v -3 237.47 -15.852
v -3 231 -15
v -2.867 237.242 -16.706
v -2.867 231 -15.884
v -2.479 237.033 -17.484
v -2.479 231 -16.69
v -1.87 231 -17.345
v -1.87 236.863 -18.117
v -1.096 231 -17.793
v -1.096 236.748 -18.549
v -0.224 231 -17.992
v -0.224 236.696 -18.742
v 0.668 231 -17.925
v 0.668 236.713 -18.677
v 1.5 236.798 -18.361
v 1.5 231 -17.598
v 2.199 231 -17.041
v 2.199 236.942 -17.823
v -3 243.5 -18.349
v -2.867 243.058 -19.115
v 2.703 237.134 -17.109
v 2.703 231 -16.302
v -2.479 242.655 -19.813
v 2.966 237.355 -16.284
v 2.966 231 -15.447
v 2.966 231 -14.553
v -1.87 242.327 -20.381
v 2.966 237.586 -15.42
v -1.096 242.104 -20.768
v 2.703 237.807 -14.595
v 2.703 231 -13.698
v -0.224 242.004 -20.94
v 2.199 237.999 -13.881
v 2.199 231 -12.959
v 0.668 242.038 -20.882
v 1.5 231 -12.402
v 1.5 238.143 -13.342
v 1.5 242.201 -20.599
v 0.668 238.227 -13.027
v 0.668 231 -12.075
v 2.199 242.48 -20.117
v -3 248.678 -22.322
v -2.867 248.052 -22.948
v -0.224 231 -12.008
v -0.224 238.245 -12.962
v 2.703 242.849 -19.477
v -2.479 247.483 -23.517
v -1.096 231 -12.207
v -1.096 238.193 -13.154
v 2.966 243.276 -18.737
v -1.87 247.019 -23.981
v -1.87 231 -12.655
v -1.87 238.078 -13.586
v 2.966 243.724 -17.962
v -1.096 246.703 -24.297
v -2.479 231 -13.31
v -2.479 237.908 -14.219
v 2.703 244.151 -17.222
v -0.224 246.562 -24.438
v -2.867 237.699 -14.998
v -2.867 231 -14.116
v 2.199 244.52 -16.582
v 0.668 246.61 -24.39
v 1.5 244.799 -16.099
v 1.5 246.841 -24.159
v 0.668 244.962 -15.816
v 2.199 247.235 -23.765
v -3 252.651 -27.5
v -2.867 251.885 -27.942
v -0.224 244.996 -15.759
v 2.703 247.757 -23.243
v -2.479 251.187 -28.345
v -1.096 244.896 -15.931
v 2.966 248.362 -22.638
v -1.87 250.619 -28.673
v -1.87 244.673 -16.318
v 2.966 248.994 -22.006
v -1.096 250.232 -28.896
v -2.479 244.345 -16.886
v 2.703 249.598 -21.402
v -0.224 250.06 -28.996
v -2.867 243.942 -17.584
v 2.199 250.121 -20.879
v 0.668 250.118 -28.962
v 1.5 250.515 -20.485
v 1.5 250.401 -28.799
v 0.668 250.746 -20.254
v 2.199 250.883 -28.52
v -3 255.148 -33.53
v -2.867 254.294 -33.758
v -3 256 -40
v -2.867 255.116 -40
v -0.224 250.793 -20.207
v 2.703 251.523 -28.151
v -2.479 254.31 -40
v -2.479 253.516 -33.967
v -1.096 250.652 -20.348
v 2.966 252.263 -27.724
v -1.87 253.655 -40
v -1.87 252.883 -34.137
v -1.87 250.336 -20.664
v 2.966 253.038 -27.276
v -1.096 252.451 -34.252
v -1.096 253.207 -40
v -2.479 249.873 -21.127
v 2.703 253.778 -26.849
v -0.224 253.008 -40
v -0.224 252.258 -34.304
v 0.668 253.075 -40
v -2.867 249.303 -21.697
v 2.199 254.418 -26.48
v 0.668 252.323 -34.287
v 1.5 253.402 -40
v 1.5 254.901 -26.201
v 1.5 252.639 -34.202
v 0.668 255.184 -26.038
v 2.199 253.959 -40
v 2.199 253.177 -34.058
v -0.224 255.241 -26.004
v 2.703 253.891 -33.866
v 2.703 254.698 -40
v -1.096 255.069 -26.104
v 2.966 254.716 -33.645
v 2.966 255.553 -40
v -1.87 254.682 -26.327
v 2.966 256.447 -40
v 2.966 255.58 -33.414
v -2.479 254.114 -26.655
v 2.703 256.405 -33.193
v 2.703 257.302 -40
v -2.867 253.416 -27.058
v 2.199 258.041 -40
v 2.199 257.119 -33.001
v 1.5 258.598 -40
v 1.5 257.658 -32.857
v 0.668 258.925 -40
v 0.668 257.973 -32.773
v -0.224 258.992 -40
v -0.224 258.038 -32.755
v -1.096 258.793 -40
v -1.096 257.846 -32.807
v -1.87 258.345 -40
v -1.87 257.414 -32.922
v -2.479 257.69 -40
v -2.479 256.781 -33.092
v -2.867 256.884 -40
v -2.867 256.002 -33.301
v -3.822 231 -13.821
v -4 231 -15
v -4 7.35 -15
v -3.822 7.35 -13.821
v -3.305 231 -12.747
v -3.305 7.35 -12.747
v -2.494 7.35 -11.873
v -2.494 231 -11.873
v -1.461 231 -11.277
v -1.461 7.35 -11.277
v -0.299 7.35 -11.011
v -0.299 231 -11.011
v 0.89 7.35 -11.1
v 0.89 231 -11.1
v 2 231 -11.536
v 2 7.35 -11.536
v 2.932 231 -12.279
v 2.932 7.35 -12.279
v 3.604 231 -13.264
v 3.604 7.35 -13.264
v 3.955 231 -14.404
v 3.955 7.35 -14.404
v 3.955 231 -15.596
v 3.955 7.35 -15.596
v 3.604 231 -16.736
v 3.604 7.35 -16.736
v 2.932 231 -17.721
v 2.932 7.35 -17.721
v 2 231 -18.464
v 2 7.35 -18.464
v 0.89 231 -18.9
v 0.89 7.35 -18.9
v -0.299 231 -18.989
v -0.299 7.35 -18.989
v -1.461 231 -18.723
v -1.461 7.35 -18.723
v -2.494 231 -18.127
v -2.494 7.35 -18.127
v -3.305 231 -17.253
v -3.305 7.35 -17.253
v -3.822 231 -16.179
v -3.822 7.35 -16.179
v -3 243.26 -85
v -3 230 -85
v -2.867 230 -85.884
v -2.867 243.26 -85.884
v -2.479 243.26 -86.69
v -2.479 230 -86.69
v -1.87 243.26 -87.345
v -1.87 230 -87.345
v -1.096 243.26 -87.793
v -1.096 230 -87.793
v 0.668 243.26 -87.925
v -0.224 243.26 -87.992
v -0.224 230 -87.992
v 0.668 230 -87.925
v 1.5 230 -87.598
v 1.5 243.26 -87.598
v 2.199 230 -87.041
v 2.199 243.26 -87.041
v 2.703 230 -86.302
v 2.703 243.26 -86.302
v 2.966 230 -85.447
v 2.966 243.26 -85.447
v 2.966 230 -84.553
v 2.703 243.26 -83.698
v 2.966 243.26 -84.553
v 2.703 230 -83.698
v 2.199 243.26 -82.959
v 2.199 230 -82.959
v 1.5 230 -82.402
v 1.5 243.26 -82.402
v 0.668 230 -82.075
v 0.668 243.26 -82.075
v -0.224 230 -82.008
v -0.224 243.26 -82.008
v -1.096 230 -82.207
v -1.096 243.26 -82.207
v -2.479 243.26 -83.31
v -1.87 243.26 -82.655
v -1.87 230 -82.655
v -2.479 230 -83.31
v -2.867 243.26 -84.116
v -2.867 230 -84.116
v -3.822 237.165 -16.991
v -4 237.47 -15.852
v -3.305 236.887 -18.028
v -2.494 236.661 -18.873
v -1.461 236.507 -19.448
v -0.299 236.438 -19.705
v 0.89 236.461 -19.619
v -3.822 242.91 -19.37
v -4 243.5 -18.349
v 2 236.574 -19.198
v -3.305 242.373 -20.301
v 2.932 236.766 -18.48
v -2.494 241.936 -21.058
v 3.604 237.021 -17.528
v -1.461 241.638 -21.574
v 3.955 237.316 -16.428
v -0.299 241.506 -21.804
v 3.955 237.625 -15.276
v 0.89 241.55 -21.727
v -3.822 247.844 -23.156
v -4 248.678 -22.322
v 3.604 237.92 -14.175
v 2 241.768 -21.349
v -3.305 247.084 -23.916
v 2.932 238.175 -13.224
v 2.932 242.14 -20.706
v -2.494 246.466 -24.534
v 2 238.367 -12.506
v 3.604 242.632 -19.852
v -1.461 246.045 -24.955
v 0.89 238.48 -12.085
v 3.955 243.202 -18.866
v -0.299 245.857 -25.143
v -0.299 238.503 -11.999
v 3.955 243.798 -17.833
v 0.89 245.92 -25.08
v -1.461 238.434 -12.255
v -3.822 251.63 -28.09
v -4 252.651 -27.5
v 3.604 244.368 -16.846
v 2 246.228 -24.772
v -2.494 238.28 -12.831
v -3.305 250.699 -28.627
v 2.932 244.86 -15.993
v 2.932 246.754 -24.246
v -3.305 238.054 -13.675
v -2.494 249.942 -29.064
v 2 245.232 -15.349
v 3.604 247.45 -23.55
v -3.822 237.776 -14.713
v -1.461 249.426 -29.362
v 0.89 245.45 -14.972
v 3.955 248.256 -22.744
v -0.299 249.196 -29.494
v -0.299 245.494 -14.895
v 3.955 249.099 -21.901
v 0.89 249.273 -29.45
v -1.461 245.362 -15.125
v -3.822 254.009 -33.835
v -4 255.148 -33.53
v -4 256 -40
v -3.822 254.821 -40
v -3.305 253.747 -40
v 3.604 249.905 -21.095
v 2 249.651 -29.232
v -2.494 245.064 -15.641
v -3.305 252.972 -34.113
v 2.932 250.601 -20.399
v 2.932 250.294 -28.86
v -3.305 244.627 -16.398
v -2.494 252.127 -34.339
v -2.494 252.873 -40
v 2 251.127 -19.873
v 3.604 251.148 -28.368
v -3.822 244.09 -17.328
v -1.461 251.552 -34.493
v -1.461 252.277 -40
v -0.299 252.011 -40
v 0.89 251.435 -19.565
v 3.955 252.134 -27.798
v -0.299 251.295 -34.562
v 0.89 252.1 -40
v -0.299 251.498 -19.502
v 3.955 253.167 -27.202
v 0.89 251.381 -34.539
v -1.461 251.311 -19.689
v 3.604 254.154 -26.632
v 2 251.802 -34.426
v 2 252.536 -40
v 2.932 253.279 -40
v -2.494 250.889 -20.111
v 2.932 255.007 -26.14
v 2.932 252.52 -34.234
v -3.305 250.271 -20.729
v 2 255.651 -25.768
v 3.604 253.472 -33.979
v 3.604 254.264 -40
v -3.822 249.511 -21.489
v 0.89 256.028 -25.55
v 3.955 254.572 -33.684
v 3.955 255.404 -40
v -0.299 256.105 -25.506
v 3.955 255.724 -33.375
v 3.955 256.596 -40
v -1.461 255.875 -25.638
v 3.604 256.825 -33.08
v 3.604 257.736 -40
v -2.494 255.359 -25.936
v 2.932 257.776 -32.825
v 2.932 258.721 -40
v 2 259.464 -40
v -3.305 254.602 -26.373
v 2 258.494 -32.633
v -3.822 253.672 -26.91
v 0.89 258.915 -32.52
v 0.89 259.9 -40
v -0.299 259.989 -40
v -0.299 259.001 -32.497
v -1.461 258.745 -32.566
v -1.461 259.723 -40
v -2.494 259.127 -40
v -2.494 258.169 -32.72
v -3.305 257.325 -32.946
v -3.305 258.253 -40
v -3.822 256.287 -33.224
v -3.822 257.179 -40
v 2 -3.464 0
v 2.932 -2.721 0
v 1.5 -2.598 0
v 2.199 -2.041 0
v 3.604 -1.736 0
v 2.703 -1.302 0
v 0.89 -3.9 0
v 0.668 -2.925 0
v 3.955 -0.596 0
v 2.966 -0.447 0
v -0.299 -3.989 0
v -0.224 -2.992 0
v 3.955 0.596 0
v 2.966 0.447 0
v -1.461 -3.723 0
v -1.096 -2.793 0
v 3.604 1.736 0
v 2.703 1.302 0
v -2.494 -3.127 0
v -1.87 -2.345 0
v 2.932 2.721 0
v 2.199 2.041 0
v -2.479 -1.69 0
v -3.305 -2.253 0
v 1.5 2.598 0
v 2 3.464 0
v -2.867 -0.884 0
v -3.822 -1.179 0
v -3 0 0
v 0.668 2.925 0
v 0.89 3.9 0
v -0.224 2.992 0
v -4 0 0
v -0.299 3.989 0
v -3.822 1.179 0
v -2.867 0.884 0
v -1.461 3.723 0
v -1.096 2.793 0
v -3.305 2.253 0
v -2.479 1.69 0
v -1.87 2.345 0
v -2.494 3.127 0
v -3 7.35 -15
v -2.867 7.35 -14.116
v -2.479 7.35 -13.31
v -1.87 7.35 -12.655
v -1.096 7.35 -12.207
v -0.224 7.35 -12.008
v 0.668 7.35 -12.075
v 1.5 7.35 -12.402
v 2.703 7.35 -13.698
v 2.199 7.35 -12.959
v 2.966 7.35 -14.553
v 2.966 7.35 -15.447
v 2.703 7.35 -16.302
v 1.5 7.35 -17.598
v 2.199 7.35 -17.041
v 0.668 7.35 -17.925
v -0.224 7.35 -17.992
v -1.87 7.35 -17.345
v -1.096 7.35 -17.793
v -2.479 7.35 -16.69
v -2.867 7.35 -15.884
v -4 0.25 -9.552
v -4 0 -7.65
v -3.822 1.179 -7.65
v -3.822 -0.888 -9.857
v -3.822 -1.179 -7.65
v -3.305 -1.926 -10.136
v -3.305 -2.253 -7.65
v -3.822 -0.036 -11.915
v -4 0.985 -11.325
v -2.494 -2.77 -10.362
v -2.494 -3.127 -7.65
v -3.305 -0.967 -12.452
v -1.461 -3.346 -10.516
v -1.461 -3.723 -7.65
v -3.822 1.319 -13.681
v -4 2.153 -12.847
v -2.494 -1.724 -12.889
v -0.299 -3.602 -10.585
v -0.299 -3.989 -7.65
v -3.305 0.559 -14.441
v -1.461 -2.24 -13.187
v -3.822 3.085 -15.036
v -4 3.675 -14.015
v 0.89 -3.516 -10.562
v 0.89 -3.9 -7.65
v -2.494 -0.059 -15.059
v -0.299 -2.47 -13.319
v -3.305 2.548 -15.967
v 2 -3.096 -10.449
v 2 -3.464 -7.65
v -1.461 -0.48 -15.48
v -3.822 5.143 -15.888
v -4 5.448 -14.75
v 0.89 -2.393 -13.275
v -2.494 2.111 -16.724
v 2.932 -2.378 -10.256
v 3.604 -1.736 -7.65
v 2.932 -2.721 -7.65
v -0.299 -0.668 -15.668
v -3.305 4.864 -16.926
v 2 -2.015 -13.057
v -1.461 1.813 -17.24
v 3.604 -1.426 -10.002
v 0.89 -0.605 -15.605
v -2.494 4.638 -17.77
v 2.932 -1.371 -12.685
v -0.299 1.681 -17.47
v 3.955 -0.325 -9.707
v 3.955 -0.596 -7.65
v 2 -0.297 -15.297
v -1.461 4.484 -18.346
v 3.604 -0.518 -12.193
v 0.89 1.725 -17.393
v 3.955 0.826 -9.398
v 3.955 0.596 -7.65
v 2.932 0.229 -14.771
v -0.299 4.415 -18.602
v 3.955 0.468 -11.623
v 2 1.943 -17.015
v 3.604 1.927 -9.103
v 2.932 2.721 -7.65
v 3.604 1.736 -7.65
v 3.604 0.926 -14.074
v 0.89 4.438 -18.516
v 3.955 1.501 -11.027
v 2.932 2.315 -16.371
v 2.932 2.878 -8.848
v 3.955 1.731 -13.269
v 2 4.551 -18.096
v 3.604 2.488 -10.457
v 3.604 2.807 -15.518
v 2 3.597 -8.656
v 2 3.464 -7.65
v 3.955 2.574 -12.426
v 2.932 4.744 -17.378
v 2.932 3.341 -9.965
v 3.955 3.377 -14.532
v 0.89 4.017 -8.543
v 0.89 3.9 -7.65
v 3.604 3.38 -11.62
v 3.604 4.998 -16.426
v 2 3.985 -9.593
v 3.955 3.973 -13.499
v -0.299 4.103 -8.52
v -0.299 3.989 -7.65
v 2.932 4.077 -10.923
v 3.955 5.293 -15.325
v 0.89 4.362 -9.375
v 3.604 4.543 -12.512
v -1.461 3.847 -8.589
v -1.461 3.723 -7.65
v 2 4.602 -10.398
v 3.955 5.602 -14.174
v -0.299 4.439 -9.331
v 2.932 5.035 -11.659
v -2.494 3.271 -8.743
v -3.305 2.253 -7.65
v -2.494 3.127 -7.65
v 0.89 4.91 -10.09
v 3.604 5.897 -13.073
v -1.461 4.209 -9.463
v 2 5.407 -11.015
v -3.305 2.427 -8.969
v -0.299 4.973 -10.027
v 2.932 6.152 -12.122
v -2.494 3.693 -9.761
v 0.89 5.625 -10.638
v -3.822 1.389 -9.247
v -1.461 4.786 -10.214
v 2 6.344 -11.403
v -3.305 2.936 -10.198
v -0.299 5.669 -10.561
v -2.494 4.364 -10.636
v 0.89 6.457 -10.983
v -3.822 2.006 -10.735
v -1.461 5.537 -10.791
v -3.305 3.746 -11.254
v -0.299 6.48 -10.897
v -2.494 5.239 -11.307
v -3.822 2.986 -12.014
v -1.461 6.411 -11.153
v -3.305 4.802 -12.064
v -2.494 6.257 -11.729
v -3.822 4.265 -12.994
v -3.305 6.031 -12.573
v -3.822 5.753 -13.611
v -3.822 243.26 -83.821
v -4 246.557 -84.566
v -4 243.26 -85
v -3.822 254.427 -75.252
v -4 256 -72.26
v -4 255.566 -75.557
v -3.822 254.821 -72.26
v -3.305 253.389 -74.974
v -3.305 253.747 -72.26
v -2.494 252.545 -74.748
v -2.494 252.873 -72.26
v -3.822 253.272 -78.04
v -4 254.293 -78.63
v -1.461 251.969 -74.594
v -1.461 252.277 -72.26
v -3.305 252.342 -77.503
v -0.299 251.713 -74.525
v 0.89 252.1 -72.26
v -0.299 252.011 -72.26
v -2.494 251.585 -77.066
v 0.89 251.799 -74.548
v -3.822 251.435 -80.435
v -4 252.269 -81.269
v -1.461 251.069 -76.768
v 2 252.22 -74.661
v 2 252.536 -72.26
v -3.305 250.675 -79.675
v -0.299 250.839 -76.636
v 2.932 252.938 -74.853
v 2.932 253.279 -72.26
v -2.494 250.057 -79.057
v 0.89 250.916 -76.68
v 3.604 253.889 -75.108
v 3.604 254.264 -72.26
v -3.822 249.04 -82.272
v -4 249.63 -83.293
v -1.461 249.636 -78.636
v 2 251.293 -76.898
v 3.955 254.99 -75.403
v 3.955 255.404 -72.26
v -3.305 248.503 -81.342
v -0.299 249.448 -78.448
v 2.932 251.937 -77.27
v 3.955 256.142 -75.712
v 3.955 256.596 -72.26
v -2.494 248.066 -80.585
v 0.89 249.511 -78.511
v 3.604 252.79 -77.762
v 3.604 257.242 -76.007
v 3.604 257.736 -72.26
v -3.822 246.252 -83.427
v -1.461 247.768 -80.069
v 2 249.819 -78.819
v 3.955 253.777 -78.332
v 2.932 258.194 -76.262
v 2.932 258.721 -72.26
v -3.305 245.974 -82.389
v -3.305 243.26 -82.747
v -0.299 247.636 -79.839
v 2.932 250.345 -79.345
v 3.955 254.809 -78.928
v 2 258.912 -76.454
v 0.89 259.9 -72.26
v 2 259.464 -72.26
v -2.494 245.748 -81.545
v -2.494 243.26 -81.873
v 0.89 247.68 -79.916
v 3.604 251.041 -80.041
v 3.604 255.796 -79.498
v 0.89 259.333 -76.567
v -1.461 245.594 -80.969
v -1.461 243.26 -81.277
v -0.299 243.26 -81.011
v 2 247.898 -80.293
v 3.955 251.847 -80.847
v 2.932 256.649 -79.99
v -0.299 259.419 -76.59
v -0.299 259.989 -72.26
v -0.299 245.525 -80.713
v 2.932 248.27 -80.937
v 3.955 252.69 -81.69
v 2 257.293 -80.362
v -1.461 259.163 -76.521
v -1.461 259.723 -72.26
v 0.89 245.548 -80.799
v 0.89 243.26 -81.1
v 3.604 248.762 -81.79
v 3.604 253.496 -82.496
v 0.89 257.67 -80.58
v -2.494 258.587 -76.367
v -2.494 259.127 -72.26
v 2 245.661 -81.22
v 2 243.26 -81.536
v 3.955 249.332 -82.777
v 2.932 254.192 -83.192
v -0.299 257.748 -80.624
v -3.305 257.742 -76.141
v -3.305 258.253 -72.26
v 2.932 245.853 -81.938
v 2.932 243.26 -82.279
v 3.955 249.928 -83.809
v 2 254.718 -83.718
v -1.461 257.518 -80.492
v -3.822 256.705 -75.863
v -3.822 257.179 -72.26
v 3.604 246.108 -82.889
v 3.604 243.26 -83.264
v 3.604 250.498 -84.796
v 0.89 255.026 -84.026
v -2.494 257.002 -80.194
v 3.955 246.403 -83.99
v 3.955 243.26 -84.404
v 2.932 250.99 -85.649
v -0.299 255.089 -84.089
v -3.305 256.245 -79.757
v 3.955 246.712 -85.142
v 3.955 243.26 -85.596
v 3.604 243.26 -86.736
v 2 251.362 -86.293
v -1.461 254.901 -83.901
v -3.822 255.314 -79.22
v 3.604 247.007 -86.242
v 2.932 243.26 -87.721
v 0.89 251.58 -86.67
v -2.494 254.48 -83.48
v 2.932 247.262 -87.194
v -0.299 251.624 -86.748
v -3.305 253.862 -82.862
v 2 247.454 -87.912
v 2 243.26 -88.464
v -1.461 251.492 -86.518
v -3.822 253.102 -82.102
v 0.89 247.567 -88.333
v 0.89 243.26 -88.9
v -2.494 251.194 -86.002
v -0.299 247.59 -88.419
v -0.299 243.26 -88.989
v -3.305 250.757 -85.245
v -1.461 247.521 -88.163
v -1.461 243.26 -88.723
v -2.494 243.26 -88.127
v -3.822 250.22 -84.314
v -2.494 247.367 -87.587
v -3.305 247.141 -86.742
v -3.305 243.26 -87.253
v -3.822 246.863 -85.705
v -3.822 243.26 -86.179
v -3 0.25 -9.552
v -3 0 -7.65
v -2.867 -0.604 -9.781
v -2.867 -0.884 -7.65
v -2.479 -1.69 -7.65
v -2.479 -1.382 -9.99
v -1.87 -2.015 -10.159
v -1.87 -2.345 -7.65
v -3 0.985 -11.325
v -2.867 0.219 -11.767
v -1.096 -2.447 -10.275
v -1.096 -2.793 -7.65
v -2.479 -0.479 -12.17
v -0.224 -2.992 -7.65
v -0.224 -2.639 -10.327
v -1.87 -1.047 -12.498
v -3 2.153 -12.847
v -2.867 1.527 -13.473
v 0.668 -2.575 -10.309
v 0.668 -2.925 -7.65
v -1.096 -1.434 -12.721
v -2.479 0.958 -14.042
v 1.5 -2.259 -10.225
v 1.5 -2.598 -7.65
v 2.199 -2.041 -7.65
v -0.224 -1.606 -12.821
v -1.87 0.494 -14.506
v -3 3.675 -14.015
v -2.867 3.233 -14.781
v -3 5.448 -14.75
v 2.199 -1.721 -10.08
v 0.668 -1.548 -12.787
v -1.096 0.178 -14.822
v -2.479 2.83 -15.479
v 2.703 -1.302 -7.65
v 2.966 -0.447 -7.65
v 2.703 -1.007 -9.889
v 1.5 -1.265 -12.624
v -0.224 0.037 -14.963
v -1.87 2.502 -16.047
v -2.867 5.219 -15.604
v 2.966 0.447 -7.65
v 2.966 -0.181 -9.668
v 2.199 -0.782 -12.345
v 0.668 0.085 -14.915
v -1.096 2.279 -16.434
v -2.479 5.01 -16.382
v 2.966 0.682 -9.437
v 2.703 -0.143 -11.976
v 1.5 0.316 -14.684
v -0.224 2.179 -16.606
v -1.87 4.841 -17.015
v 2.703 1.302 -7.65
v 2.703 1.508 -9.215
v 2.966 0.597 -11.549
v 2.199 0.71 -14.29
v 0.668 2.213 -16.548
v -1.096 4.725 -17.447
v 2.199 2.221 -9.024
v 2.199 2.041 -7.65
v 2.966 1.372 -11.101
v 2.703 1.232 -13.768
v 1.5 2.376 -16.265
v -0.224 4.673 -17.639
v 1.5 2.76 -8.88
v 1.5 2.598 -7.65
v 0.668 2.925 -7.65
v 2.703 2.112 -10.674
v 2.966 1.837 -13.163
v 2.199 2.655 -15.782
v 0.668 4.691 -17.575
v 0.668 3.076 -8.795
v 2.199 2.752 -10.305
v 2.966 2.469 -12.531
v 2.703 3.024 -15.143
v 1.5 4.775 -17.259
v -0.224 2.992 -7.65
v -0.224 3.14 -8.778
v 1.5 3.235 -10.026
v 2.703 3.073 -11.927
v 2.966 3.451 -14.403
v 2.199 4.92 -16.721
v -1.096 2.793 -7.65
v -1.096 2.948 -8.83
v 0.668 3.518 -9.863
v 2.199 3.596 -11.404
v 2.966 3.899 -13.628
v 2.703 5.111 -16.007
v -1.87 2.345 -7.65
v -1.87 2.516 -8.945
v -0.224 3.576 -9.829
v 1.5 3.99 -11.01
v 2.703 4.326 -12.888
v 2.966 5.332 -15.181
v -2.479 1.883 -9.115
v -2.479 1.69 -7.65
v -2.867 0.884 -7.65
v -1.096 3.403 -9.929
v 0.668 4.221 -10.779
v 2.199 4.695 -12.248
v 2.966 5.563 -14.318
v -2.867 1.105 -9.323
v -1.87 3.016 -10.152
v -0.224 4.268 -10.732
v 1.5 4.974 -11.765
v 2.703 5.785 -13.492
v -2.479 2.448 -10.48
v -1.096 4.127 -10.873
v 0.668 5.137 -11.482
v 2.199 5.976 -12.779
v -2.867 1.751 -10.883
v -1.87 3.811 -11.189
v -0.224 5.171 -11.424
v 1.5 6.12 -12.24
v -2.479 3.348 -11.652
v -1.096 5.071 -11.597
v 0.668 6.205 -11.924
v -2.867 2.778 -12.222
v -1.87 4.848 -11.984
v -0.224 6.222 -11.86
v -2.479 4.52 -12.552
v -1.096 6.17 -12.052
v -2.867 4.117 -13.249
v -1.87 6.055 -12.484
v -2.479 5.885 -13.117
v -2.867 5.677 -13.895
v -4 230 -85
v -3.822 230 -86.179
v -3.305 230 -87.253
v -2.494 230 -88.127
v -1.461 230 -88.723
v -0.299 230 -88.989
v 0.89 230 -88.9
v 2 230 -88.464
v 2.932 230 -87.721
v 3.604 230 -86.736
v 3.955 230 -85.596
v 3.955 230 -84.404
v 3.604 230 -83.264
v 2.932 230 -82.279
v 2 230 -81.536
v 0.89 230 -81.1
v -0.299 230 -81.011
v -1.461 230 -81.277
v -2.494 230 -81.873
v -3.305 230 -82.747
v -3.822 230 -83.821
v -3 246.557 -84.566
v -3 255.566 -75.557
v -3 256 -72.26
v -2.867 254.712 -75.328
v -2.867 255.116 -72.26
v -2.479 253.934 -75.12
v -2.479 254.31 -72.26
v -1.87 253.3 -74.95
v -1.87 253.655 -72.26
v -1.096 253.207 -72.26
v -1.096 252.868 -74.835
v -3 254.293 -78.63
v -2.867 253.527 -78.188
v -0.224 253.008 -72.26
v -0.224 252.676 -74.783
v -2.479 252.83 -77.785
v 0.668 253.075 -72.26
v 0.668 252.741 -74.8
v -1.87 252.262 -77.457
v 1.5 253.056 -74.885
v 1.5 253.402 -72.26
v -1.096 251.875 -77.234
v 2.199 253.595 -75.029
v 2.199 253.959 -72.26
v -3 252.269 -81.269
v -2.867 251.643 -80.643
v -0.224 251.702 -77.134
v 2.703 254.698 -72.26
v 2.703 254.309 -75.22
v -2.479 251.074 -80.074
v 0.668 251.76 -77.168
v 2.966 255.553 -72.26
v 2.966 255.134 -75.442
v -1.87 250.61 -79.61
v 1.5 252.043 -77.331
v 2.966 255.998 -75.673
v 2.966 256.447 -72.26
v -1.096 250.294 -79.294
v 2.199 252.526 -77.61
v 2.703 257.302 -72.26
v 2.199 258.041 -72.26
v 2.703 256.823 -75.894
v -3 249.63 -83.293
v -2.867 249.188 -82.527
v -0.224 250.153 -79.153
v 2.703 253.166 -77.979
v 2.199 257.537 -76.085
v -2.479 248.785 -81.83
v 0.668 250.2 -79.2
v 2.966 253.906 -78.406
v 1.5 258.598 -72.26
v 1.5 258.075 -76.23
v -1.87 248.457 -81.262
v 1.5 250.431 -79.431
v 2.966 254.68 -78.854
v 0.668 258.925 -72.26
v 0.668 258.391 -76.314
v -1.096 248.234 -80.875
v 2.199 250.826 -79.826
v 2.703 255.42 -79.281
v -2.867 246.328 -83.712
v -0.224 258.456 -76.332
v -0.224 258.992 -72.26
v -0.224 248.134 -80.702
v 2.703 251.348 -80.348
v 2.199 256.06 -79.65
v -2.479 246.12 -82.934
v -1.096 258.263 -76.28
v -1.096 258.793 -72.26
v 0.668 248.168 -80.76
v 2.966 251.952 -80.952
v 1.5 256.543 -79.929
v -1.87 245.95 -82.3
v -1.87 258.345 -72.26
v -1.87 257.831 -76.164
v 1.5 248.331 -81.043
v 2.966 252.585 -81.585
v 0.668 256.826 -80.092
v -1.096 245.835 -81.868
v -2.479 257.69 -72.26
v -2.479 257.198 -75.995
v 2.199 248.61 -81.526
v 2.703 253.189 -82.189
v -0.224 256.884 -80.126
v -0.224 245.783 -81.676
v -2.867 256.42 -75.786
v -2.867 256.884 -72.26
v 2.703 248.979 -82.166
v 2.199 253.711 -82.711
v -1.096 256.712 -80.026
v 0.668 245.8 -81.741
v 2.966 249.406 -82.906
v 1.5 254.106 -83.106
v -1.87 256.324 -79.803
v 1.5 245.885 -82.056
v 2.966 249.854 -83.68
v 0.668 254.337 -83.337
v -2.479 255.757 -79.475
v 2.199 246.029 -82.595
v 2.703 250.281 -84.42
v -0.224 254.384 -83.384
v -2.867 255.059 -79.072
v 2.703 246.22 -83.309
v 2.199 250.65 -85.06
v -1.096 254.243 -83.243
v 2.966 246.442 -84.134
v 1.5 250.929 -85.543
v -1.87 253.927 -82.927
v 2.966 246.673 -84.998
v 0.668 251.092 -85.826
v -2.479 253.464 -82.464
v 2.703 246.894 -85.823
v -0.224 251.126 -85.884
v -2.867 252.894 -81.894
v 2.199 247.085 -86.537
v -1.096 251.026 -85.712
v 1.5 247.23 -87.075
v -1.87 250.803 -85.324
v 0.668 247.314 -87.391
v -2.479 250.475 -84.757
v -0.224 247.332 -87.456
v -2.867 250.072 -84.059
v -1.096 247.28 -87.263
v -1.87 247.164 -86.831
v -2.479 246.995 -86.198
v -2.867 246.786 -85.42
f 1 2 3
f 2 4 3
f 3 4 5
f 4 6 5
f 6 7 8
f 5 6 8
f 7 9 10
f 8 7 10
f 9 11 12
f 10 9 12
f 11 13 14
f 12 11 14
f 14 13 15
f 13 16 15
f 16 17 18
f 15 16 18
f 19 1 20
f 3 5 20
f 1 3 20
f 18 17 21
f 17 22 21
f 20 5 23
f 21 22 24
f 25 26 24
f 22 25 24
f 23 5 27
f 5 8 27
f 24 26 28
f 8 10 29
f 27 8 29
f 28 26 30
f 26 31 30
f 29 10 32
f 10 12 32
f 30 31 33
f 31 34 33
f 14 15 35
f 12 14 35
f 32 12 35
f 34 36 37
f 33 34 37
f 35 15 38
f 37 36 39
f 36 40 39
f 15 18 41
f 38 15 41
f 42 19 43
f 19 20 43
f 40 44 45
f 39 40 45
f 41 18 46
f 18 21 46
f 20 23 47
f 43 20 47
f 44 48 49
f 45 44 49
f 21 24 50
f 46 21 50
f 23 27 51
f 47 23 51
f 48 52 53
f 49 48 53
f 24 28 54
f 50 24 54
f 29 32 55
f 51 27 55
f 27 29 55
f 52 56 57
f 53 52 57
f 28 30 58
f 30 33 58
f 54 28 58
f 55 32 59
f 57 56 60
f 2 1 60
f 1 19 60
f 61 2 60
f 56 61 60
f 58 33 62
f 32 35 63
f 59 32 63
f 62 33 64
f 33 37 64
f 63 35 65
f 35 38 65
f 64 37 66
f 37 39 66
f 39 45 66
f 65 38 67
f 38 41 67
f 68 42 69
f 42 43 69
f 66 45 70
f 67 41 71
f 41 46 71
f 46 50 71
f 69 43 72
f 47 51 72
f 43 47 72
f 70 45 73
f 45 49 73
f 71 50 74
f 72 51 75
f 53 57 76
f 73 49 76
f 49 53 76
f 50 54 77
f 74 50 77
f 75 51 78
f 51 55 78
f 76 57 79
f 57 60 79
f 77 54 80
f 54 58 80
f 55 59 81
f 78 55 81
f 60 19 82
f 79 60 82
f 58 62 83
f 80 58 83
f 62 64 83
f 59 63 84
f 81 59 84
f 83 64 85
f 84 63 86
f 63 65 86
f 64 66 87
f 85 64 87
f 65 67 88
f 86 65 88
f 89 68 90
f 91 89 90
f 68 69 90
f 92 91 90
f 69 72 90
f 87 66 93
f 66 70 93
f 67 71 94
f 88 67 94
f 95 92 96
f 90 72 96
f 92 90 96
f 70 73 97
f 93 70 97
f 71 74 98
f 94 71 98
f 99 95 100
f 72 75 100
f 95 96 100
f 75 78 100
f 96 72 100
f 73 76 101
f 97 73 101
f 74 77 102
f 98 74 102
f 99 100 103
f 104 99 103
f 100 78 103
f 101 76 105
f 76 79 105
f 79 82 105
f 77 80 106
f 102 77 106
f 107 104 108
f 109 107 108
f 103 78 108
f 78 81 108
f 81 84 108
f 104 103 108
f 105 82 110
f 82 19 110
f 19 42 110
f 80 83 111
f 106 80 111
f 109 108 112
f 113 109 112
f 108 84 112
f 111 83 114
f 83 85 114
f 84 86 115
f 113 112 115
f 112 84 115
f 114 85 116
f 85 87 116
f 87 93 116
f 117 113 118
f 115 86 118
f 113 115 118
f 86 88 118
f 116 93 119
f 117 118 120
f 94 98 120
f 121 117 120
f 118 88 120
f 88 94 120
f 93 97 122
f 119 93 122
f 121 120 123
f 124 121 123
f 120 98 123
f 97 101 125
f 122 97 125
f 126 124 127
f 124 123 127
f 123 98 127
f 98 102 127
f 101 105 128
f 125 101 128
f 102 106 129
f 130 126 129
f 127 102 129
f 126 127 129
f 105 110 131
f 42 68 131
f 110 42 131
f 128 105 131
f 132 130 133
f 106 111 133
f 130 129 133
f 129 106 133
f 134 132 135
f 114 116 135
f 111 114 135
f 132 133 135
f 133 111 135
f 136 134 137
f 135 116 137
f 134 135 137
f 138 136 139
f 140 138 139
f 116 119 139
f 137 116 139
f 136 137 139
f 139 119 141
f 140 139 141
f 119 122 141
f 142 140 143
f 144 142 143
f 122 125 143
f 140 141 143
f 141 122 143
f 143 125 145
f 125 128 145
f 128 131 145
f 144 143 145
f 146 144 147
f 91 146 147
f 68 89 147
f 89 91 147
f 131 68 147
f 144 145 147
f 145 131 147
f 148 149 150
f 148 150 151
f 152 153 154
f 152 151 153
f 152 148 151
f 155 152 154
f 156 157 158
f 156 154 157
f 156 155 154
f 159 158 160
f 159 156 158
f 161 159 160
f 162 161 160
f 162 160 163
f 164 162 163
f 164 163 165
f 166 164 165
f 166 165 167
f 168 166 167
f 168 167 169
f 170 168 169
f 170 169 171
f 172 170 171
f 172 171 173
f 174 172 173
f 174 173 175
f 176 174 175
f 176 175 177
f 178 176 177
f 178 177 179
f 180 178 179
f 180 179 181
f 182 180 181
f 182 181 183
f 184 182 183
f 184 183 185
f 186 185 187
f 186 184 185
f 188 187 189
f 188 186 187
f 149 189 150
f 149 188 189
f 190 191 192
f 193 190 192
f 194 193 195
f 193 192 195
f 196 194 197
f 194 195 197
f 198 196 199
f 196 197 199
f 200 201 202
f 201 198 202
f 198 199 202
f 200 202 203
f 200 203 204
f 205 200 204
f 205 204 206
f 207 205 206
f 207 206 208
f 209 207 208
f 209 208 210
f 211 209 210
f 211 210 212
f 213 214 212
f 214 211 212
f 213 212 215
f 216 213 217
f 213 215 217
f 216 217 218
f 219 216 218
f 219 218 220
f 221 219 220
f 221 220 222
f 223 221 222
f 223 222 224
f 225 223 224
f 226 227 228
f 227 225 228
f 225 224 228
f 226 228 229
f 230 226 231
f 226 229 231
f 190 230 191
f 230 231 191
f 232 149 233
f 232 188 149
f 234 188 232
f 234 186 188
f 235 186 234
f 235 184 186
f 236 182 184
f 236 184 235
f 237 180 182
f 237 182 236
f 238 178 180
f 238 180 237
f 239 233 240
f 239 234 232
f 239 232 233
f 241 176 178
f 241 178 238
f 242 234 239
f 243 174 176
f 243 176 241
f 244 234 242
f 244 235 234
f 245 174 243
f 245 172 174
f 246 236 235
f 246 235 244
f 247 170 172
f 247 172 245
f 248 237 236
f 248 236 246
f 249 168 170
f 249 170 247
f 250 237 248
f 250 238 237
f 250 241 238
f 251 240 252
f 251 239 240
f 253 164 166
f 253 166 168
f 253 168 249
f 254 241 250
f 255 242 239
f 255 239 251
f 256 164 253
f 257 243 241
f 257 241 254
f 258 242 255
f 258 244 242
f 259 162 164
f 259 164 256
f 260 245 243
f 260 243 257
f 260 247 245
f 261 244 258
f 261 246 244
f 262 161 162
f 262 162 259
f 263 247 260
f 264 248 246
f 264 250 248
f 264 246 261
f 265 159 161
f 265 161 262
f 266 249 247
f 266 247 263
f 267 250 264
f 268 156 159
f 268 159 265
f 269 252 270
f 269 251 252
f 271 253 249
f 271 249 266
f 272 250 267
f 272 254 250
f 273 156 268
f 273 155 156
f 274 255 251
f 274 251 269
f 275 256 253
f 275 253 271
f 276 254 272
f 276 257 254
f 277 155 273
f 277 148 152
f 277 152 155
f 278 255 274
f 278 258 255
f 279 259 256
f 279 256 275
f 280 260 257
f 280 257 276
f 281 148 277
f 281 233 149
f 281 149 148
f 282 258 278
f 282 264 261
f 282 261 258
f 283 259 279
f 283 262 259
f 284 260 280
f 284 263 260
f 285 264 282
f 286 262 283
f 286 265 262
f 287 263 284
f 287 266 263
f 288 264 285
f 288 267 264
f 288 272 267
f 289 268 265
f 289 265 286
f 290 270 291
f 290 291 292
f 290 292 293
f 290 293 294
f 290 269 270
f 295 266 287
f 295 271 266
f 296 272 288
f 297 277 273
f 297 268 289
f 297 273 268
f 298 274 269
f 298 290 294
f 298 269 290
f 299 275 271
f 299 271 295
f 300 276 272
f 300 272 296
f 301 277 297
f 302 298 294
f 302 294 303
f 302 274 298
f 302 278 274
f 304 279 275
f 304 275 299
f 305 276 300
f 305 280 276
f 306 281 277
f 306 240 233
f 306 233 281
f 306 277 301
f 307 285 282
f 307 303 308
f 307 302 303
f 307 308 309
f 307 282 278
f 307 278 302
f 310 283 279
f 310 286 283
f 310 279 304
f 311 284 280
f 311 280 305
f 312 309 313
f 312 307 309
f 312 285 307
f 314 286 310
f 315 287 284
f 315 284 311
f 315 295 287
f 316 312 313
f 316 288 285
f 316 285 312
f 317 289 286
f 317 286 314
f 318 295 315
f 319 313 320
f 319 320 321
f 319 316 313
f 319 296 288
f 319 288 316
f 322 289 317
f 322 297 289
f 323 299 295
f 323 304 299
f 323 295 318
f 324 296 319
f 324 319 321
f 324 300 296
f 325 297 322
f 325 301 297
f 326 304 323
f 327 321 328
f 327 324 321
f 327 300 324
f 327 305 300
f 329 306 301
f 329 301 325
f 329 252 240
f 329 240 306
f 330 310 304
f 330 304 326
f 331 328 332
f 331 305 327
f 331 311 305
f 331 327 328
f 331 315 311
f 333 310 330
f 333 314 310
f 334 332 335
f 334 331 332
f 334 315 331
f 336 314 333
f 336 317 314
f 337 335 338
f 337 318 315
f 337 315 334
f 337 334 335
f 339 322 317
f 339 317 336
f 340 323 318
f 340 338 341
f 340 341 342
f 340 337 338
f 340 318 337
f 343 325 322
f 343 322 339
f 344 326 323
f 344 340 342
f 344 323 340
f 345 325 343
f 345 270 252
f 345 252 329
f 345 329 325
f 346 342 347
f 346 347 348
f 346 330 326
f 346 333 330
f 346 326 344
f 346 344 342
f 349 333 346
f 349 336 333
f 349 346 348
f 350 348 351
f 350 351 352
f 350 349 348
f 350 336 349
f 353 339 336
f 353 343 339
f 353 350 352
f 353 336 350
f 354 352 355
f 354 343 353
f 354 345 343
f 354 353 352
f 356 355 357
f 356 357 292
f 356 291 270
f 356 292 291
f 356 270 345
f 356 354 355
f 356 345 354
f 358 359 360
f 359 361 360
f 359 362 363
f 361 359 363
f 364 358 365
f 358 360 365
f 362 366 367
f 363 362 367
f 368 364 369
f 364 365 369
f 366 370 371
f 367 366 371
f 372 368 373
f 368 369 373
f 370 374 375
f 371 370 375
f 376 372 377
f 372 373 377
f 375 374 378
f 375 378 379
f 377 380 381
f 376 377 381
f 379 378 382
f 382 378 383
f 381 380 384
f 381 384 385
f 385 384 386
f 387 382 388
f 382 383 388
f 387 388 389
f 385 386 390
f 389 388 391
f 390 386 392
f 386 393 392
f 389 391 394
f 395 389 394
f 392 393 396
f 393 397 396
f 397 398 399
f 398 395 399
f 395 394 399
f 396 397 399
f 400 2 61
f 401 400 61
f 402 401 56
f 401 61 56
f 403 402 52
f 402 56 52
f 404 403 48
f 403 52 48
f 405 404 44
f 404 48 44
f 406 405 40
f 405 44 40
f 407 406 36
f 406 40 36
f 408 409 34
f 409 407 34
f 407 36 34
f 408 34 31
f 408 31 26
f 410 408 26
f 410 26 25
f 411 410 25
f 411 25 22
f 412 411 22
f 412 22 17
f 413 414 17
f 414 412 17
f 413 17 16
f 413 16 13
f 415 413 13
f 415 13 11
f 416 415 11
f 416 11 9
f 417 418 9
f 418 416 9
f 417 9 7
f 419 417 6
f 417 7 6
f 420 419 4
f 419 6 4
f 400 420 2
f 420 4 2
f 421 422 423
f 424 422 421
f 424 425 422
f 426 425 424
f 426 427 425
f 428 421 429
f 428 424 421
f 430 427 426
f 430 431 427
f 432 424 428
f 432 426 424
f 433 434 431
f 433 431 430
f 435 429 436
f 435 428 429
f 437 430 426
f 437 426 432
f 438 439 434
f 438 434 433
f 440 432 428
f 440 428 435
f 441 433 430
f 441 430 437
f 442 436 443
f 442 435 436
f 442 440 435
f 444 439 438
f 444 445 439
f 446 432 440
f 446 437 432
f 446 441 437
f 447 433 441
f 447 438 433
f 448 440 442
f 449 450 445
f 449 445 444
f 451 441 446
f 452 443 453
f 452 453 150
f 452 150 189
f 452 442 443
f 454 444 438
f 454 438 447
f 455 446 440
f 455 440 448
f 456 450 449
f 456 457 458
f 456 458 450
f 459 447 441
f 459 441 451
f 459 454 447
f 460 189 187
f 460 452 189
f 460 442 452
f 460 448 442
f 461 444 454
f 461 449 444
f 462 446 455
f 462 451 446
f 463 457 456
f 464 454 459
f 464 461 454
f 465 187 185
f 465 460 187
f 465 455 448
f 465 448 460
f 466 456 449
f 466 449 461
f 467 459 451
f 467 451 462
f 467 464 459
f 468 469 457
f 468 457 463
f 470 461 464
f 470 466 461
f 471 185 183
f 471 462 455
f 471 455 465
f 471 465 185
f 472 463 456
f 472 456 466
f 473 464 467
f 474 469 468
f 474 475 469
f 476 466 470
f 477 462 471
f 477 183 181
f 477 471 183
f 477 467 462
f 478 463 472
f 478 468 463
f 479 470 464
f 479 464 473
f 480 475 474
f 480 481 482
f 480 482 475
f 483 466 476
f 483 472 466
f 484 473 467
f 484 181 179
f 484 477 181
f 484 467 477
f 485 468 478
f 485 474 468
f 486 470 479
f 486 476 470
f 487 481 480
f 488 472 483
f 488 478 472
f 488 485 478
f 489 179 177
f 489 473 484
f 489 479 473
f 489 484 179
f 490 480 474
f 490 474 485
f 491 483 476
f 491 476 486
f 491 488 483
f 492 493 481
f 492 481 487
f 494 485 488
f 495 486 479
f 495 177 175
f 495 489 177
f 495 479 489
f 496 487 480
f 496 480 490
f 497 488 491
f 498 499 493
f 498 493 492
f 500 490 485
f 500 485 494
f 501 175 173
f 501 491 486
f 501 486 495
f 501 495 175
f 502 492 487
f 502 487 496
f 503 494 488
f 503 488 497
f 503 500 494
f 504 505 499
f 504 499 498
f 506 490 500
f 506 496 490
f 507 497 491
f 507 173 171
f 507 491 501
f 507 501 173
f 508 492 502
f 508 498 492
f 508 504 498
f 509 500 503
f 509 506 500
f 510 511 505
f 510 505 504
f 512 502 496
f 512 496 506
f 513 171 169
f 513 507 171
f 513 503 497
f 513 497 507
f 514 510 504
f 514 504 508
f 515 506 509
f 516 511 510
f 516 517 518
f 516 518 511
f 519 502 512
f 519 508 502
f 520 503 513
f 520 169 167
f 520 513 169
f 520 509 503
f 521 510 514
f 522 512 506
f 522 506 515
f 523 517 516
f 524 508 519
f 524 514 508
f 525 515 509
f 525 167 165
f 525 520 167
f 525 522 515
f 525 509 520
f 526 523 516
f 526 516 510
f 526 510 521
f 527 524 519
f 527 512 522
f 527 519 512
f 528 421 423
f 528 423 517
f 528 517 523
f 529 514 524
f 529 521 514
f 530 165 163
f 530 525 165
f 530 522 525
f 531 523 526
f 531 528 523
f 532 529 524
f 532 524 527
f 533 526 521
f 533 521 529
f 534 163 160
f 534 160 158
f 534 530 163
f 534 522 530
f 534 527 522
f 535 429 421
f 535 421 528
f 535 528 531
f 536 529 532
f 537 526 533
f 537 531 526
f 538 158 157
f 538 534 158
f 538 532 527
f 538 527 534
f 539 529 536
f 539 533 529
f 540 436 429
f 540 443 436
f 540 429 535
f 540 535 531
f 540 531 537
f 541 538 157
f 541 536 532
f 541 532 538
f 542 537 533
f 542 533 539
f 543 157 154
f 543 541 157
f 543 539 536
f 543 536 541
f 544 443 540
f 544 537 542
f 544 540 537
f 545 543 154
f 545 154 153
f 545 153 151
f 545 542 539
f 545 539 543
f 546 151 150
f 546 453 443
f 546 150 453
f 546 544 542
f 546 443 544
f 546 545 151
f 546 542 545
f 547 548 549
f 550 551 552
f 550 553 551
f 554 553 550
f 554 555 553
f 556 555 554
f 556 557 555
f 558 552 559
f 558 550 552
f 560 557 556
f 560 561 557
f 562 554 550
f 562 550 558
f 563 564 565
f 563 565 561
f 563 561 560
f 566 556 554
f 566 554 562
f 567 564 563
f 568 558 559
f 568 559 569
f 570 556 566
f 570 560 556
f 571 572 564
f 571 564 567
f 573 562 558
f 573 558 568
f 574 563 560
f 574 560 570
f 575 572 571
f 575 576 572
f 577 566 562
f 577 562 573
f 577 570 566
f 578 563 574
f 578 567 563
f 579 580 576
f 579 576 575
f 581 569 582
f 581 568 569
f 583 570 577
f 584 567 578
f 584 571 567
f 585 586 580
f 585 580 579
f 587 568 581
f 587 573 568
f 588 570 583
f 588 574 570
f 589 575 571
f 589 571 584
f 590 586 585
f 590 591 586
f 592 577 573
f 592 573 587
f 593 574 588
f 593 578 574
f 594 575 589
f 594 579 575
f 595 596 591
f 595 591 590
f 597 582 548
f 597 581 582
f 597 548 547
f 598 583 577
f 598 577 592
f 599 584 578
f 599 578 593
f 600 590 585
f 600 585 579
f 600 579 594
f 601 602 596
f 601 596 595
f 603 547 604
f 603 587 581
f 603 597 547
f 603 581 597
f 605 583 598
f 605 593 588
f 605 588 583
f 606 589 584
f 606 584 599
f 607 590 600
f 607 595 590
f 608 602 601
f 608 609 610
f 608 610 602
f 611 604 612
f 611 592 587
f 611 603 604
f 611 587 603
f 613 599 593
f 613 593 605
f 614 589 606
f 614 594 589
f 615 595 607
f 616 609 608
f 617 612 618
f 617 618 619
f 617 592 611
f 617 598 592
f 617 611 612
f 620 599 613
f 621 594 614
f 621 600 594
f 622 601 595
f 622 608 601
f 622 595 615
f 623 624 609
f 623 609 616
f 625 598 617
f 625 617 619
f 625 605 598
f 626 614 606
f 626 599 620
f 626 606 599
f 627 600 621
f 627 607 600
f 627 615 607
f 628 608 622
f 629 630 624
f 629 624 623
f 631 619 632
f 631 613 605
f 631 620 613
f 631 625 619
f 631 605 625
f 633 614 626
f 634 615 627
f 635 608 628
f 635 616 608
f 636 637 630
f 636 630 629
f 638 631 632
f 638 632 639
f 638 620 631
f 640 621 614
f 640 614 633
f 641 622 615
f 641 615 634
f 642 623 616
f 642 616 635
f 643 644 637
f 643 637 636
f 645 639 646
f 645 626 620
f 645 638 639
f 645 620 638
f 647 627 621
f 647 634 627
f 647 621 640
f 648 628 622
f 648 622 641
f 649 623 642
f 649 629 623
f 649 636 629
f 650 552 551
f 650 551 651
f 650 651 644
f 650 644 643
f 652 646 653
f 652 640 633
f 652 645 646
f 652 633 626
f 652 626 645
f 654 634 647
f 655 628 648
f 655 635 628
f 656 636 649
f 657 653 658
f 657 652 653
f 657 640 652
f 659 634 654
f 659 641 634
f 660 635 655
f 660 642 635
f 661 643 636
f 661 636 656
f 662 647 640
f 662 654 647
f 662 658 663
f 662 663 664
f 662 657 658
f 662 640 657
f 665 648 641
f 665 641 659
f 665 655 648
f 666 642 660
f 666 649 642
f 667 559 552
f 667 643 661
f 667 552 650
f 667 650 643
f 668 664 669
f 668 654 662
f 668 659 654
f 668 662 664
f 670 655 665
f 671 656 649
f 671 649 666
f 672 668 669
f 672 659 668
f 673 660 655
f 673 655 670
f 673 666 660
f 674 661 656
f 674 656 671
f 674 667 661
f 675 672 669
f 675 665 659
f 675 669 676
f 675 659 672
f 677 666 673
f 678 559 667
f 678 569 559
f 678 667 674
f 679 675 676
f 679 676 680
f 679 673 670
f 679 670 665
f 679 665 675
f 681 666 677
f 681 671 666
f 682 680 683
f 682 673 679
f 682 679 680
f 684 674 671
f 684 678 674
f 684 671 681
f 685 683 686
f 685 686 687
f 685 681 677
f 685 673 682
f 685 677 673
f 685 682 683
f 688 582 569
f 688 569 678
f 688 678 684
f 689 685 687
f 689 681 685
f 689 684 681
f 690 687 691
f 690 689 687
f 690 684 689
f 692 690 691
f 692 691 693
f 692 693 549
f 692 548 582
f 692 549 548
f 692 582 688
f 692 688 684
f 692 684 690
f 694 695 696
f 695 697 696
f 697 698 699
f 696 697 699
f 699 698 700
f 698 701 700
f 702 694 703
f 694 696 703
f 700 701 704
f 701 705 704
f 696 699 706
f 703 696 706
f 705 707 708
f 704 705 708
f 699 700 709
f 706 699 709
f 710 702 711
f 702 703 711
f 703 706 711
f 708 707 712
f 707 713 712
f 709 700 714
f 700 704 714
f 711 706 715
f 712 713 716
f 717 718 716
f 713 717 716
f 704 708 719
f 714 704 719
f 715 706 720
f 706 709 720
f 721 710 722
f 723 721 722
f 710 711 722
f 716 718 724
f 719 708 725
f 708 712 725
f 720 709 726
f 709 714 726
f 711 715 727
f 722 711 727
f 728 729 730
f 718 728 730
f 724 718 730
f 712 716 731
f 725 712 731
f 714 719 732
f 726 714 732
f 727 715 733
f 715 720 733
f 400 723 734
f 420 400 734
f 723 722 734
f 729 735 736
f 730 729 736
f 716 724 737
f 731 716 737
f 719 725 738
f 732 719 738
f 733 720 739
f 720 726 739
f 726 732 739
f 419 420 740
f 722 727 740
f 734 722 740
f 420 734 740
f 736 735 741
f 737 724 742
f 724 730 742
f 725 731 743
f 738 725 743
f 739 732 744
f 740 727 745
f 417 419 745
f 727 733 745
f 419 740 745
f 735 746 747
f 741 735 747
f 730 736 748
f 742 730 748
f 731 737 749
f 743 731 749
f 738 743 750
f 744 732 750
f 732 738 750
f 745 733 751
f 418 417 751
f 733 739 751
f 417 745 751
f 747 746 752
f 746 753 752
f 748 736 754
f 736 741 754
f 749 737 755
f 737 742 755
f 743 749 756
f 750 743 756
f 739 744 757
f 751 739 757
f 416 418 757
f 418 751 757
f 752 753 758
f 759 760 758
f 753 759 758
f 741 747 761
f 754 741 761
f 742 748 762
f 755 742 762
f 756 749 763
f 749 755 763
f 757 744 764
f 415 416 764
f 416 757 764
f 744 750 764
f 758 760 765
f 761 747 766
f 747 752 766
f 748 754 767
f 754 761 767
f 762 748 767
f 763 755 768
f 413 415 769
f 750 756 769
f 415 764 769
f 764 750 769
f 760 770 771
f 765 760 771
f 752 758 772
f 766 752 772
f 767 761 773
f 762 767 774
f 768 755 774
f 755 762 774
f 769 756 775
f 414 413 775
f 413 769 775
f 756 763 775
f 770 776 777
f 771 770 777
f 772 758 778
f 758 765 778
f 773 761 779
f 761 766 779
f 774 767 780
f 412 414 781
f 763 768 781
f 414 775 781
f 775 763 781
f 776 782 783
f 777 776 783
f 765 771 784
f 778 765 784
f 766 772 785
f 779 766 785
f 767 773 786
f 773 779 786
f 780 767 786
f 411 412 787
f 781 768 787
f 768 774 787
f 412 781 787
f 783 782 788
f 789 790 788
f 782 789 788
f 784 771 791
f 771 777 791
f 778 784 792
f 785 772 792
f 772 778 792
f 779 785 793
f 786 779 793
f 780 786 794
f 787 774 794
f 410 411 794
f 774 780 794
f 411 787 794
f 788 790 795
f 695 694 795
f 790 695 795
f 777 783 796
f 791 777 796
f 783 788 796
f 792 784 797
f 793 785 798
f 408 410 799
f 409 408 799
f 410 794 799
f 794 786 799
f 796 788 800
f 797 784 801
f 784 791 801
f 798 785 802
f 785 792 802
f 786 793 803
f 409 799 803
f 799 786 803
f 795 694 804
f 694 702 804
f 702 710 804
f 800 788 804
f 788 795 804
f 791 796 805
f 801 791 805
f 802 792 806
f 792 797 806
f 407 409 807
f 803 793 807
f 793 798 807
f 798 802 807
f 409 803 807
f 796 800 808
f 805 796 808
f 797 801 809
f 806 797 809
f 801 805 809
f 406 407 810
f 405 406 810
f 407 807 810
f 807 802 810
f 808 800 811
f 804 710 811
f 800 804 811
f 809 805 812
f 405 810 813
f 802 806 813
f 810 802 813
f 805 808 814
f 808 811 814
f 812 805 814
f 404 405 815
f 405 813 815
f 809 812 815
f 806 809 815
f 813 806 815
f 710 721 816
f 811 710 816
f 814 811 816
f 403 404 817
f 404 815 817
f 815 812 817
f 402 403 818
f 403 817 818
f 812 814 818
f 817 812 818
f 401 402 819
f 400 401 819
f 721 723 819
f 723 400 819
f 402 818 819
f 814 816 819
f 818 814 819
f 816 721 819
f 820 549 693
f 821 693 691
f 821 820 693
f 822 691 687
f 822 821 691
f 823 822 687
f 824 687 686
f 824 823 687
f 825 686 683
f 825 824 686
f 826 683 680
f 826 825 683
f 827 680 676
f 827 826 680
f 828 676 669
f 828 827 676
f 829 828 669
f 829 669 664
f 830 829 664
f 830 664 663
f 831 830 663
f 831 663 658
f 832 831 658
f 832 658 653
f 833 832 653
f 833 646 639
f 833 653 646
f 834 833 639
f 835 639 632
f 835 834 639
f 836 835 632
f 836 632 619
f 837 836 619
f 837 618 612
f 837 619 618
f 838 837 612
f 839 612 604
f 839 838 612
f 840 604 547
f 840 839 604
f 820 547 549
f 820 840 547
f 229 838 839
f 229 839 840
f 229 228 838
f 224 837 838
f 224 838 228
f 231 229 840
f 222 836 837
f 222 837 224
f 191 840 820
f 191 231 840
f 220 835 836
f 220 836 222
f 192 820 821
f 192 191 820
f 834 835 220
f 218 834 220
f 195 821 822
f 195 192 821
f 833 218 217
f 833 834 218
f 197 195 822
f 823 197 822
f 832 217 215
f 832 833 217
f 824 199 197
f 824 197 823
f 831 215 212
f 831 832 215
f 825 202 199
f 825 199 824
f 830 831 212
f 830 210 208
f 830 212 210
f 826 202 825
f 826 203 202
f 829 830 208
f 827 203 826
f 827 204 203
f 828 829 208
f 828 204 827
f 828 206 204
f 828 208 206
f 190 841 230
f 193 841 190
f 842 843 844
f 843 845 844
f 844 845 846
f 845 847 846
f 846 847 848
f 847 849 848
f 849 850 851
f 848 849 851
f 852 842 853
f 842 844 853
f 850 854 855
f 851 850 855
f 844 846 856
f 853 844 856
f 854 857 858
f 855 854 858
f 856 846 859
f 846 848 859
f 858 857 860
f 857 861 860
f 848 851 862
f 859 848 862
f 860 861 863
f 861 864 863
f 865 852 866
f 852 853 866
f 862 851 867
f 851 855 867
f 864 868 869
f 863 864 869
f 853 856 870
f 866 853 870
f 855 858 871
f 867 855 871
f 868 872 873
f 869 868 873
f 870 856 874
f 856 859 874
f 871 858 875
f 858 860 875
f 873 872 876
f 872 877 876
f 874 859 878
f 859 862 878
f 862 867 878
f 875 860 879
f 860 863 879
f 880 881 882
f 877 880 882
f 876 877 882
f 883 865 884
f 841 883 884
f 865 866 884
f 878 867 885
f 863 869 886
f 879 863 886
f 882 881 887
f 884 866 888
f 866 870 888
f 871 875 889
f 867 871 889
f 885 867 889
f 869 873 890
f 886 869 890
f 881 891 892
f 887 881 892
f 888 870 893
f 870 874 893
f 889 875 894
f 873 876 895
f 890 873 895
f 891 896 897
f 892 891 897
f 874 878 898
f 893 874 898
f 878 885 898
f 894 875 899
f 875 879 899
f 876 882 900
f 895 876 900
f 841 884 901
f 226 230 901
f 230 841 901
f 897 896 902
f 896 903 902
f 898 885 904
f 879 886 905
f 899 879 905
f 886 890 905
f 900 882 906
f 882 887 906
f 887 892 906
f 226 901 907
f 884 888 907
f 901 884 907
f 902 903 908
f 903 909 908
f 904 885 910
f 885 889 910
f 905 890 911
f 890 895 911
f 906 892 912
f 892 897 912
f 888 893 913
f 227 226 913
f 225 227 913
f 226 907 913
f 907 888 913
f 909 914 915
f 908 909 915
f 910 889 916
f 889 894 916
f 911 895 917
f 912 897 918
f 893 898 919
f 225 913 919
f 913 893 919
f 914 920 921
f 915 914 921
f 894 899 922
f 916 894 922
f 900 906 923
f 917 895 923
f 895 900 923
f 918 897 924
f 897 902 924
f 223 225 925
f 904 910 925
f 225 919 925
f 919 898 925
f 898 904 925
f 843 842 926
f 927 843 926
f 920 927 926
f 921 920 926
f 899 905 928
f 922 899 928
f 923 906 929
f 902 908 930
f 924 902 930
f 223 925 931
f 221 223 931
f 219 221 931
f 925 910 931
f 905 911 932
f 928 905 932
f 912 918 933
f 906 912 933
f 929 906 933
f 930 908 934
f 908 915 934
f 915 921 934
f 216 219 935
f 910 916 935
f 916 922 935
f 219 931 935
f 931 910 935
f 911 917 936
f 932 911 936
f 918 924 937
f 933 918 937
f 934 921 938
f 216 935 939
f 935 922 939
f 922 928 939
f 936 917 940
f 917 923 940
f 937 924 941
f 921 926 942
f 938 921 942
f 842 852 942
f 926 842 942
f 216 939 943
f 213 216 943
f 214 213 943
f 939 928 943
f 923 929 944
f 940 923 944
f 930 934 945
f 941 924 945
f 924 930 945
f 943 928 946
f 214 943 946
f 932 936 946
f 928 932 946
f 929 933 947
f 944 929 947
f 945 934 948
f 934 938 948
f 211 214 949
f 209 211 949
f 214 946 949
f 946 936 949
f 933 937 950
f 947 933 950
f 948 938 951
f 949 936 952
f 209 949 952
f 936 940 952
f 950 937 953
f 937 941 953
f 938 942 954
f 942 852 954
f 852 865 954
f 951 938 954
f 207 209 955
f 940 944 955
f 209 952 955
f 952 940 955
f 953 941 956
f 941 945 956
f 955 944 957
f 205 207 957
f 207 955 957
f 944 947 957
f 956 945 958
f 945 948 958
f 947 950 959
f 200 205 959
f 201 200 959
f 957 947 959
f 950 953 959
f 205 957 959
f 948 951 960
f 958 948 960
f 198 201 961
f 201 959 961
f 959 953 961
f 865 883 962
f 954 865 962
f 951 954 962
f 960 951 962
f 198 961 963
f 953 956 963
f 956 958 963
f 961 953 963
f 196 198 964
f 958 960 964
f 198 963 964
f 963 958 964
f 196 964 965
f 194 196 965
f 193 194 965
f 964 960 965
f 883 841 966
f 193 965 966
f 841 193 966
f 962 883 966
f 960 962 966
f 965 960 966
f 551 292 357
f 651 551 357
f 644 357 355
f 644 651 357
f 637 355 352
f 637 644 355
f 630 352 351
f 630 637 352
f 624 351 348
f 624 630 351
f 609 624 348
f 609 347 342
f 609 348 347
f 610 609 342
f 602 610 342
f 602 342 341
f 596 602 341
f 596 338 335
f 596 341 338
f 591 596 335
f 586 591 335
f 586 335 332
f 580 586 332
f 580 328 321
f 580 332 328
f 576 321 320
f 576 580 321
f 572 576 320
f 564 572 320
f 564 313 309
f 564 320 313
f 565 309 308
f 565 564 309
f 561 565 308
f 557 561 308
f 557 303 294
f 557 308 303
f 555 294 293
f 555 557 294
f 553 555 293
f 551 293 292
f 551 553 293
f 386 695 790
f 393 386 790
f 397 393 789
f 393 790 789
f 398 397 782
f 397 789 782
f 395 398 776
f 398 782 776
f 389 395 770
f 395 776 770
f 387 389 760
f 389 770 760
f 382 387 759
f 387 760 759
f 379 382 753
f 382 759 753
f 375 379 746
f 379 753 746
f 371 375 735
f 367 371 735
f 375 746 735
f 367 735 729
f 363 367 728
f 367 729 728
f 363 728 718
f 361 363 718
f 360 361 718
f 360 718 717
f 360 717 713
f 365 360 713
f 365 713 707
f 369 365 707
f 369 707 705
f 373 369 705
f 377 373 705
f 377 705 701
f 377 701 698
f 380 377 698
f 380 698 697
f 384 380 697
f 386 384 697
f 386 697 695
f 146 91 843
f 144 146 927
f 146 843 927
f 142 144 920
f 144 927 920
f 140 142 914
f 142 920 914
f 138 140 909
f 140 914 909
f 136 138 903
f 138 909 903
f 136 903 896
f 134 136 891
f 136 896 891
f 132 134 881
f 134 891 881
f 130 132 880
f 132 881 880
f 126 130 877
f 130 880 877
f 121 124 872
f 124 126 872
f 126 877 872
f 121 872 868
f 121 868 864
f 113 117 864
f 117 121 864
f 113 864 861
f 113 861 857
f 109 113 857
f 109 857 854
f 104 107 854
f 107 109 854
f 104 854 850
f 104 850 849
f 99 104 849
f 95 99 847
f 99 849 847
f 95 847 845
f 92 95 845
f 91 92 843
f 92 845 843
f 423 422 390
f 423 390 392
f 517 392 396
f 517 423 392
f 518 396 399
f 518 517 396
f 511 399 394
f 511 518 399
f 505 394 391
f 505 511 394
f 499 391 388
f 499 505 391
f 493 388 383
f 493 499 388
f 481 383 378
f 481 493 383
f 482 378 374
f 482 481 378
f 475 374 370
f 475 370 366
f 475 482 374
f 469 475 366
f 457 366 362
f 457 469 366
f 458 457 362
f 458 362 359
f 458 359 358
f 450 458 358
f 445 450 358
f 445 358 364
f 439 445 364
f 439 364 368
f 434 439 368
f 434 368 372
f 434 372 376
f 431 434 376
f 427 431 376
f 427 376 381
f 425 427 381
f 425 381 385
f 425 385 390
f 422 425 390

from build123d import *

# Parameters (mm, degrees)
SWEEP1_PROFILE_R                           = 4
HOLLOW_TUBE_OD_AND_WALL_PROVISIONAL_PROF_R = 3


with BuildPart() as part:
    # Sweep1: sweep along a curve in space
    with BuildLine() as sweep1_path:
        Line((0, 0, 0), (0, 0, -7.65000054))
        ThreePointArc((0, 0, -7.65000054), (0, 2.152765191, -12.847235191), (0, 7.35, -15))
        Line((0, 7.35, -15), (0, 231.000001606, -15))
        ThreePointArc((0, 231.000001606, -15), (0, 248.677670568, -22.322330568), (0, 256, -40))
        Line((0, 256, -40), (0, 256, -72.259998661))
        ThreePointArc((0, 256, -72.259998661), (0, 252.268540474, -81.268539526), (0, 243.26, -85))
        Line((0, 243.26, -85), (0, 230, -85))
    # Sweep1 profile (on start of the path) → Sweep1 (sweep)
    with BuildSketch(Plane(origin=(0, 0, 0), x_dir=(-1, 0, 0), z_dir=(0, 0, -1))):
        Circle(SWEEP1_PROFILE_R)
    sweep(path=sweep1_path.line)

    # Hollow_tube_OD_and_wall_PROVISIONAL: sweep along a curve in space
    with BuildLine() as hollow_tube_od_and_wall_provisional_path:
        Line((0, 0, 0), (0, 0, -7.65000054))
        ThreePointArc((0, 0, -7.65000054), (0, 2.152765191, -12.847235191), (0, 7.35, -15))
        Line((0, 7.35, -15), (0, 231.000001606, -15))
        ThreePointArc((0, 231.000001606, -15), (0, 248.677670568, -22.322330568), (0, 256, -40))
        Line((0, 256, -40), (0, 256, -72.259998661))
        ThreePointArc((0, 256, -72.259998661), (0, 252.268540474, -81.268539526), (0, 243.26, -85))
        Line((0, 243.26, -85), (0, 230, -85))
    # Hollow_tube_OD_and_wall_PROVISIONAL prof (on start of the path) → Hollow_tube_OD_and_wall_PROVISIONAL (sweep, cut)
    with BuildSketch(Plane(origin=(0, 0, 0), x_dir=(-1, 0, 0), z_dir=(0, 0, -1))):
        Circle(HOLLOW_TUBE_OD_AND_WALL_PROVISIONAL_PROF_R)
    sweep(path=hollow_tube_od_and_wall_provisional_path.line, mode=Mode.SUBTRACT)


solid = part.part
